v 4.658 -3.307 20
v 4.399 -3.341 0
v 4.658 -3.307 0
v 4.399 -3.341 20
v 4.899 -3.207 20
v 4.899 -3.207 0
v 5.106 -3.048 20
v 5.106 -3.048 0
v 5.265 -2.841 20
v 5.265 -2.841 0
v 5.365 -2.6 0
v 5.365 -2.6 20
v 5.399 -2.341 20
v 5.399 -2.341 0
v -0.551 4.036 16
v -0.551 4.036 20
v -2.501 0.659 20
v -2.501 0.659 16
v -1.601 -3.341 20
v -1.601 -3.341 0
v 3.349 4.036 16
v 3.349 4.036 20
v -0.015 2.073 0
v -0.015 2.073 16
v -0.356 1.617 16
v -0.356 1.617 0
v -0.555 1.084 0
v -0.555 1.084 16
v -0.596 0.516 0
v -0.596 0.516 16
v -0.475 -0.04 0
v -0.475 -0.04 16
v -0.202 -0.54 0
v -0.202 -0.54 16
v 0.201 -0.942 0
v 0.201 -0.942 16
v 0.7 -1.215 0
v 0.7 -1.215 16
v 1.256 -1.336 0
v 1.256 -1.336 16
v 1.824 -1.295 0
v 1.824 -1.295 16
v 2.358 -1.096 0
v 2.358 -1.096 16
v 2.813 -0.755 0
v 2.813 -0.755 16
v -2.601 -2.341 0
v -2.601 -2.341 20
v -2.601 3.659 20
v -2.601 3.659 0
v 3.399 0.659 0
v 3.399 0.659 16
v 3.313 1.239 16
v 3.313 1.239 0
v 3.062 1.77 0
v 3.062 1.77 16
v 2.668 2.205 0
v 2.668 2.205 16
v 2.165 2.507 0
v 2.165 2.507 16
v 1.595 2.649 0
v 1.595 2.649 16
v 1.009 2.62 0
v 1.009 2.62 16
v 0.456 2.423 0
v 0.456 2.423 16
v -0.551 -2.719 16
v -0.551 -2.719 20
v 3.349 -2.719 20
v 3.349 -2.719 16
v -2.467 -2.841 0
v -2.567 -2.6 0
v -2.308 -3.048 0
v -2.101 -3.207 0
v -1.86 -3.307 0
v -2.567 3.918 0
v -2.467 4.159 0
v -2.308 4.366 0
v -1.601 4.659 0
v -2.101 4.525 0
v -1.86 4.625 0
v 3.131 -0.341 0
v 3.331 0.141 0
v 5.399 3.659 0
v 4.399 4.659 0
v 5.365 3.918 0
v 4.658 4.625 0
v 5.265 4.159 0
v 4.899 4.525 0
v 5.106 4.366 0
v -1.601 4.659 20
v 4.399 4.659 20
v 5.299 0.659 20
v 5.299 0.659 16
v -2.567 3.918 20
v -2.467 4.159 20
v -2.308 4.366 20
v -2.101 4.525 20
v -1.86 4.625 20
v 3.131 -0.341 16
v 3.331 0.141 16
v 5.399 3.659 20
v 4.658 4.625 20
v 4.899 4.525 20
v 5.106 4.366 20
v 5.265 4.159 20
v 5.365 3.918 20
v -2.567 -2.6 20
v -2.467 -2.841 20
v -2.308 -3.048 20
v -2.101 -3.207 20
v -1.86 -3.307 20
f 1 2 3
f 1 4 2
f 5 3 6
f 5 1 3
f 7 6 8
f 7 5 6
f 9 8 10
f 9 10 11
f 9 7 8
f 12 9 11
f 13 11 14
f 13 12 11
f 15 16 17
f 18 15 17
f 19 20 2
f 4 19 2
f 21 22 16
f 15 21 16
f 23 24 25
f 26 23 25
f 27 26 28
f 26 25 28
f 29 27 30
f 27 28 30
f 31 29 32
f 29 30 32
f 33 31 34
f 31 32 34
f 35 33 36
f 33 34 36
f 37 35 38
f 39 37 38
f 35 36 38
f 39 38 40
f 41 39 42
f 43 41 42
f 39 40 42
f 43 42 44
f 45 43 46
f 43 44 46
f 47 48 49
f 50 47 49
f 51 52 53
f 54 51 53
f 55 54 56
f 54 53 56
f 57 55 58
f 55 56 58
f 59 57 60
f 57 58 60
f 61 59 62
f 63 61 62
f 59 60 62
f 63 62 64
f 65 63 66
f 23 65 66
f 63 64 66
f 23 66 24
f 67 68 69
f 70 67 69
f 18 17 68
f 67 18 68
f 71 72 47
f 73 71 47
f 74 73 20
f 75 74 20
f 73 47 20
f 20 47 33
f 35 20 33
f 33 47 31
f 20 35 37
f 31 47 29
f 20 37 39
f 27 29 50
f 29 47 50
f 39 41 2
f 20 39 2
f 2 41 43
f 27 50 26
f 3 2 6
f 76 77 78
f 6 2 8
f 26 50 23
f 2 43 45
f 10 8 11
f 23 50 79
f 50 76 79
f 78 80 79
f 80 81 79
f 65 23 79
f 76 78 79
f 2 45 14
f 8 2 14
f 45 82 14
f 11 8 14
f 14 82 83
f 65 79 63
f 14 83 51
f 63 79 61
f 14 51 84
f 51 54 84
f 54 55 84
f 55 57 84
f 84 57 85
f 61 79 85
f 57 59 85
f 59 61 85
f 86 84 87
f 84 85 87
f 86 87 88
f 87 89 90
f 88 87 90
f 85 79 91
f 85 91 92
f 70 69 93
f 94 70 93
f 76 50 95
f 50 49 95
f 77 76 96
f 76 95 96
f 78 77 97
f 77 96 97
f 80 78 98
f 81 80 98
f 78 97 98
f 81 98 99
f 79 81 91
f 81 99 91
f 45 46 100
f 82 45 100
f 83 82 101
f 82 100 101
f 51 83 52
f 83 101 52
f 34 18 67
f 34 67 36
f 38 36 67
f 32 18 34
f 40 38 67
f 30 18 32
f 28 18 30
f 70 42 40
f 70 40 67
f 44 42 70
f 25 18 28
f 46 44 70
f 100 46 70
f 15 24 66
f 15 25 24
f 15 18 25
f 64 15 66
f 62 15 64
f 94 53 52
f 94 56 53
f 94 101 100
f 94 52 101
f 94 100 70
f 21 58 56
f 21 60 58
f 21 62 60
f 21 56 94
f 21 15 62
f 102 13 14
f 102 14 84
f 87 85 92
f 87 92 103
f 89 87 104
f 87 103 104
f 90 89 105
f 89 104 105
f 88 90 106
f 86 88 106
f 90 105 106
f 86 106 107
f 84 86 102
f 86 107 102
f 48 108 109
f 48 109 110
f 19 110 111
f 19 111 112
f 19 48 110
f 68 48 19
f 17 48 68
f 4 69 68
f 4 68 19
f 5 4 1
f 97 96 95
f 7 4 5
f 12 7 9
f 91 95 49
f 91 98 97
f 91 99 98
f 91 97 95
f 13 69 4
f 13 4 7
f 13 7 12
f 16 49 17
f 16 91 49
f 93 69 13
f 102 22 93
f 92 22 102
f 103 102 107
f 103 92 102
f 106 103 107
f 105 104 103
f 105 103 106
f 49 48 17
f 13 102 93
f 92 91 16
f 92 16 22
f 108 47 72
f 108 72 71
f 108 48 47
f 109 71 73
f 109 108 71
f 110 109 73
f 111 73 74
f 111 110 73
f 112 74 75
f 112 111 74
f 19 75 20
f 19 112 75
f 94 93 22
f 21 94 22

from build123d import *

# Parameters (mm, degrees)
SKETCH1_W           = 8
SKETCH1_H           = 8
BOSS_EXTRUDE1_DEPTH = 20
CUT_EXTRUDE1_DEPTH  = 20
CUT_EXTRUDE8_DEPTH  = 4
FILLET1_R           = 1
FILLET2_R           = 1


with BuildPart() as part:
    # Sketch1 → Boss-Extrude1 (new body)
    with BuildSketch(Plane.XY):
        with Locations((1.399149149, 0.658917954)):
            Rectangle(SKETCH1_W, SKETCH1_H)
    extrude(amount=BOSS_EXTRUDE1_DEPTH)

    # Sketch4 → Cut-Extrude1 (cut)
    with BuildSketch(Plane.XY.offset(20)):
        with BuildLine():
            ThreePointArc((3.399149149, 0.658917954), (2.164516014, 2.506677019), (-0.015064413, 2.073131517))
            Line((-0.015064413, 2.073131517), (2.813362712, -0.755295608))
            ThreePointArc((2.813362712, -0.755295608), (3.246908214, -0.10644891), (3.399149149, 0.658917954))
        make_face()
        with BuildLine():
            Line((2.813362712, -0.755295608), (-0.015064413, 2.073131517))
            ThreePointArc((-0.015064413, 2.073131517), (-0.015064413, -0.755295608), (2.813362712, -0.755295608))
        make_face()
    extrude(amount=-CUT_EXTRUDE1_DEPTH, mode=Mode.SUBTRACT)

    # Sketch5 → Cut-Extrude8 (cut)
    with BuildSketch(Plane.XY.offset(20)):
        Polygon((-2.500850851, 0.658917954), (-0.550850851, -2.71858112), (3.349149149, -2.71858112), (5.299149149, 0.658917954), (3.349149149, 4.036417029), (-0.550850851, 4.036417029), align=None)
    extrude(amount=-CUT_EXTRUDE8_DEPTH, mode=Mode.SUBTRACT)

    # Fillet1
    fillet1_edges = [part.edges().sort_by_distance(p)[0] for p in [
        (-2.600850851, 4.658917954, 10),
        (5.399149149, 4.658917954, 10),
        (5.399149149, -3.341082046, 10),
    ]]
    fillet(fillet1_edges, radius=FILLET1_R)

    # Fillet2
    fillet2_edges = [part.edges().sort_by_distance(p)[0] for p in [
        (-2.600850851, -3.341082046, 10),
    ]]
    fillet(fillet2_edges, radius=FILLET2_R)


solid = part.part
